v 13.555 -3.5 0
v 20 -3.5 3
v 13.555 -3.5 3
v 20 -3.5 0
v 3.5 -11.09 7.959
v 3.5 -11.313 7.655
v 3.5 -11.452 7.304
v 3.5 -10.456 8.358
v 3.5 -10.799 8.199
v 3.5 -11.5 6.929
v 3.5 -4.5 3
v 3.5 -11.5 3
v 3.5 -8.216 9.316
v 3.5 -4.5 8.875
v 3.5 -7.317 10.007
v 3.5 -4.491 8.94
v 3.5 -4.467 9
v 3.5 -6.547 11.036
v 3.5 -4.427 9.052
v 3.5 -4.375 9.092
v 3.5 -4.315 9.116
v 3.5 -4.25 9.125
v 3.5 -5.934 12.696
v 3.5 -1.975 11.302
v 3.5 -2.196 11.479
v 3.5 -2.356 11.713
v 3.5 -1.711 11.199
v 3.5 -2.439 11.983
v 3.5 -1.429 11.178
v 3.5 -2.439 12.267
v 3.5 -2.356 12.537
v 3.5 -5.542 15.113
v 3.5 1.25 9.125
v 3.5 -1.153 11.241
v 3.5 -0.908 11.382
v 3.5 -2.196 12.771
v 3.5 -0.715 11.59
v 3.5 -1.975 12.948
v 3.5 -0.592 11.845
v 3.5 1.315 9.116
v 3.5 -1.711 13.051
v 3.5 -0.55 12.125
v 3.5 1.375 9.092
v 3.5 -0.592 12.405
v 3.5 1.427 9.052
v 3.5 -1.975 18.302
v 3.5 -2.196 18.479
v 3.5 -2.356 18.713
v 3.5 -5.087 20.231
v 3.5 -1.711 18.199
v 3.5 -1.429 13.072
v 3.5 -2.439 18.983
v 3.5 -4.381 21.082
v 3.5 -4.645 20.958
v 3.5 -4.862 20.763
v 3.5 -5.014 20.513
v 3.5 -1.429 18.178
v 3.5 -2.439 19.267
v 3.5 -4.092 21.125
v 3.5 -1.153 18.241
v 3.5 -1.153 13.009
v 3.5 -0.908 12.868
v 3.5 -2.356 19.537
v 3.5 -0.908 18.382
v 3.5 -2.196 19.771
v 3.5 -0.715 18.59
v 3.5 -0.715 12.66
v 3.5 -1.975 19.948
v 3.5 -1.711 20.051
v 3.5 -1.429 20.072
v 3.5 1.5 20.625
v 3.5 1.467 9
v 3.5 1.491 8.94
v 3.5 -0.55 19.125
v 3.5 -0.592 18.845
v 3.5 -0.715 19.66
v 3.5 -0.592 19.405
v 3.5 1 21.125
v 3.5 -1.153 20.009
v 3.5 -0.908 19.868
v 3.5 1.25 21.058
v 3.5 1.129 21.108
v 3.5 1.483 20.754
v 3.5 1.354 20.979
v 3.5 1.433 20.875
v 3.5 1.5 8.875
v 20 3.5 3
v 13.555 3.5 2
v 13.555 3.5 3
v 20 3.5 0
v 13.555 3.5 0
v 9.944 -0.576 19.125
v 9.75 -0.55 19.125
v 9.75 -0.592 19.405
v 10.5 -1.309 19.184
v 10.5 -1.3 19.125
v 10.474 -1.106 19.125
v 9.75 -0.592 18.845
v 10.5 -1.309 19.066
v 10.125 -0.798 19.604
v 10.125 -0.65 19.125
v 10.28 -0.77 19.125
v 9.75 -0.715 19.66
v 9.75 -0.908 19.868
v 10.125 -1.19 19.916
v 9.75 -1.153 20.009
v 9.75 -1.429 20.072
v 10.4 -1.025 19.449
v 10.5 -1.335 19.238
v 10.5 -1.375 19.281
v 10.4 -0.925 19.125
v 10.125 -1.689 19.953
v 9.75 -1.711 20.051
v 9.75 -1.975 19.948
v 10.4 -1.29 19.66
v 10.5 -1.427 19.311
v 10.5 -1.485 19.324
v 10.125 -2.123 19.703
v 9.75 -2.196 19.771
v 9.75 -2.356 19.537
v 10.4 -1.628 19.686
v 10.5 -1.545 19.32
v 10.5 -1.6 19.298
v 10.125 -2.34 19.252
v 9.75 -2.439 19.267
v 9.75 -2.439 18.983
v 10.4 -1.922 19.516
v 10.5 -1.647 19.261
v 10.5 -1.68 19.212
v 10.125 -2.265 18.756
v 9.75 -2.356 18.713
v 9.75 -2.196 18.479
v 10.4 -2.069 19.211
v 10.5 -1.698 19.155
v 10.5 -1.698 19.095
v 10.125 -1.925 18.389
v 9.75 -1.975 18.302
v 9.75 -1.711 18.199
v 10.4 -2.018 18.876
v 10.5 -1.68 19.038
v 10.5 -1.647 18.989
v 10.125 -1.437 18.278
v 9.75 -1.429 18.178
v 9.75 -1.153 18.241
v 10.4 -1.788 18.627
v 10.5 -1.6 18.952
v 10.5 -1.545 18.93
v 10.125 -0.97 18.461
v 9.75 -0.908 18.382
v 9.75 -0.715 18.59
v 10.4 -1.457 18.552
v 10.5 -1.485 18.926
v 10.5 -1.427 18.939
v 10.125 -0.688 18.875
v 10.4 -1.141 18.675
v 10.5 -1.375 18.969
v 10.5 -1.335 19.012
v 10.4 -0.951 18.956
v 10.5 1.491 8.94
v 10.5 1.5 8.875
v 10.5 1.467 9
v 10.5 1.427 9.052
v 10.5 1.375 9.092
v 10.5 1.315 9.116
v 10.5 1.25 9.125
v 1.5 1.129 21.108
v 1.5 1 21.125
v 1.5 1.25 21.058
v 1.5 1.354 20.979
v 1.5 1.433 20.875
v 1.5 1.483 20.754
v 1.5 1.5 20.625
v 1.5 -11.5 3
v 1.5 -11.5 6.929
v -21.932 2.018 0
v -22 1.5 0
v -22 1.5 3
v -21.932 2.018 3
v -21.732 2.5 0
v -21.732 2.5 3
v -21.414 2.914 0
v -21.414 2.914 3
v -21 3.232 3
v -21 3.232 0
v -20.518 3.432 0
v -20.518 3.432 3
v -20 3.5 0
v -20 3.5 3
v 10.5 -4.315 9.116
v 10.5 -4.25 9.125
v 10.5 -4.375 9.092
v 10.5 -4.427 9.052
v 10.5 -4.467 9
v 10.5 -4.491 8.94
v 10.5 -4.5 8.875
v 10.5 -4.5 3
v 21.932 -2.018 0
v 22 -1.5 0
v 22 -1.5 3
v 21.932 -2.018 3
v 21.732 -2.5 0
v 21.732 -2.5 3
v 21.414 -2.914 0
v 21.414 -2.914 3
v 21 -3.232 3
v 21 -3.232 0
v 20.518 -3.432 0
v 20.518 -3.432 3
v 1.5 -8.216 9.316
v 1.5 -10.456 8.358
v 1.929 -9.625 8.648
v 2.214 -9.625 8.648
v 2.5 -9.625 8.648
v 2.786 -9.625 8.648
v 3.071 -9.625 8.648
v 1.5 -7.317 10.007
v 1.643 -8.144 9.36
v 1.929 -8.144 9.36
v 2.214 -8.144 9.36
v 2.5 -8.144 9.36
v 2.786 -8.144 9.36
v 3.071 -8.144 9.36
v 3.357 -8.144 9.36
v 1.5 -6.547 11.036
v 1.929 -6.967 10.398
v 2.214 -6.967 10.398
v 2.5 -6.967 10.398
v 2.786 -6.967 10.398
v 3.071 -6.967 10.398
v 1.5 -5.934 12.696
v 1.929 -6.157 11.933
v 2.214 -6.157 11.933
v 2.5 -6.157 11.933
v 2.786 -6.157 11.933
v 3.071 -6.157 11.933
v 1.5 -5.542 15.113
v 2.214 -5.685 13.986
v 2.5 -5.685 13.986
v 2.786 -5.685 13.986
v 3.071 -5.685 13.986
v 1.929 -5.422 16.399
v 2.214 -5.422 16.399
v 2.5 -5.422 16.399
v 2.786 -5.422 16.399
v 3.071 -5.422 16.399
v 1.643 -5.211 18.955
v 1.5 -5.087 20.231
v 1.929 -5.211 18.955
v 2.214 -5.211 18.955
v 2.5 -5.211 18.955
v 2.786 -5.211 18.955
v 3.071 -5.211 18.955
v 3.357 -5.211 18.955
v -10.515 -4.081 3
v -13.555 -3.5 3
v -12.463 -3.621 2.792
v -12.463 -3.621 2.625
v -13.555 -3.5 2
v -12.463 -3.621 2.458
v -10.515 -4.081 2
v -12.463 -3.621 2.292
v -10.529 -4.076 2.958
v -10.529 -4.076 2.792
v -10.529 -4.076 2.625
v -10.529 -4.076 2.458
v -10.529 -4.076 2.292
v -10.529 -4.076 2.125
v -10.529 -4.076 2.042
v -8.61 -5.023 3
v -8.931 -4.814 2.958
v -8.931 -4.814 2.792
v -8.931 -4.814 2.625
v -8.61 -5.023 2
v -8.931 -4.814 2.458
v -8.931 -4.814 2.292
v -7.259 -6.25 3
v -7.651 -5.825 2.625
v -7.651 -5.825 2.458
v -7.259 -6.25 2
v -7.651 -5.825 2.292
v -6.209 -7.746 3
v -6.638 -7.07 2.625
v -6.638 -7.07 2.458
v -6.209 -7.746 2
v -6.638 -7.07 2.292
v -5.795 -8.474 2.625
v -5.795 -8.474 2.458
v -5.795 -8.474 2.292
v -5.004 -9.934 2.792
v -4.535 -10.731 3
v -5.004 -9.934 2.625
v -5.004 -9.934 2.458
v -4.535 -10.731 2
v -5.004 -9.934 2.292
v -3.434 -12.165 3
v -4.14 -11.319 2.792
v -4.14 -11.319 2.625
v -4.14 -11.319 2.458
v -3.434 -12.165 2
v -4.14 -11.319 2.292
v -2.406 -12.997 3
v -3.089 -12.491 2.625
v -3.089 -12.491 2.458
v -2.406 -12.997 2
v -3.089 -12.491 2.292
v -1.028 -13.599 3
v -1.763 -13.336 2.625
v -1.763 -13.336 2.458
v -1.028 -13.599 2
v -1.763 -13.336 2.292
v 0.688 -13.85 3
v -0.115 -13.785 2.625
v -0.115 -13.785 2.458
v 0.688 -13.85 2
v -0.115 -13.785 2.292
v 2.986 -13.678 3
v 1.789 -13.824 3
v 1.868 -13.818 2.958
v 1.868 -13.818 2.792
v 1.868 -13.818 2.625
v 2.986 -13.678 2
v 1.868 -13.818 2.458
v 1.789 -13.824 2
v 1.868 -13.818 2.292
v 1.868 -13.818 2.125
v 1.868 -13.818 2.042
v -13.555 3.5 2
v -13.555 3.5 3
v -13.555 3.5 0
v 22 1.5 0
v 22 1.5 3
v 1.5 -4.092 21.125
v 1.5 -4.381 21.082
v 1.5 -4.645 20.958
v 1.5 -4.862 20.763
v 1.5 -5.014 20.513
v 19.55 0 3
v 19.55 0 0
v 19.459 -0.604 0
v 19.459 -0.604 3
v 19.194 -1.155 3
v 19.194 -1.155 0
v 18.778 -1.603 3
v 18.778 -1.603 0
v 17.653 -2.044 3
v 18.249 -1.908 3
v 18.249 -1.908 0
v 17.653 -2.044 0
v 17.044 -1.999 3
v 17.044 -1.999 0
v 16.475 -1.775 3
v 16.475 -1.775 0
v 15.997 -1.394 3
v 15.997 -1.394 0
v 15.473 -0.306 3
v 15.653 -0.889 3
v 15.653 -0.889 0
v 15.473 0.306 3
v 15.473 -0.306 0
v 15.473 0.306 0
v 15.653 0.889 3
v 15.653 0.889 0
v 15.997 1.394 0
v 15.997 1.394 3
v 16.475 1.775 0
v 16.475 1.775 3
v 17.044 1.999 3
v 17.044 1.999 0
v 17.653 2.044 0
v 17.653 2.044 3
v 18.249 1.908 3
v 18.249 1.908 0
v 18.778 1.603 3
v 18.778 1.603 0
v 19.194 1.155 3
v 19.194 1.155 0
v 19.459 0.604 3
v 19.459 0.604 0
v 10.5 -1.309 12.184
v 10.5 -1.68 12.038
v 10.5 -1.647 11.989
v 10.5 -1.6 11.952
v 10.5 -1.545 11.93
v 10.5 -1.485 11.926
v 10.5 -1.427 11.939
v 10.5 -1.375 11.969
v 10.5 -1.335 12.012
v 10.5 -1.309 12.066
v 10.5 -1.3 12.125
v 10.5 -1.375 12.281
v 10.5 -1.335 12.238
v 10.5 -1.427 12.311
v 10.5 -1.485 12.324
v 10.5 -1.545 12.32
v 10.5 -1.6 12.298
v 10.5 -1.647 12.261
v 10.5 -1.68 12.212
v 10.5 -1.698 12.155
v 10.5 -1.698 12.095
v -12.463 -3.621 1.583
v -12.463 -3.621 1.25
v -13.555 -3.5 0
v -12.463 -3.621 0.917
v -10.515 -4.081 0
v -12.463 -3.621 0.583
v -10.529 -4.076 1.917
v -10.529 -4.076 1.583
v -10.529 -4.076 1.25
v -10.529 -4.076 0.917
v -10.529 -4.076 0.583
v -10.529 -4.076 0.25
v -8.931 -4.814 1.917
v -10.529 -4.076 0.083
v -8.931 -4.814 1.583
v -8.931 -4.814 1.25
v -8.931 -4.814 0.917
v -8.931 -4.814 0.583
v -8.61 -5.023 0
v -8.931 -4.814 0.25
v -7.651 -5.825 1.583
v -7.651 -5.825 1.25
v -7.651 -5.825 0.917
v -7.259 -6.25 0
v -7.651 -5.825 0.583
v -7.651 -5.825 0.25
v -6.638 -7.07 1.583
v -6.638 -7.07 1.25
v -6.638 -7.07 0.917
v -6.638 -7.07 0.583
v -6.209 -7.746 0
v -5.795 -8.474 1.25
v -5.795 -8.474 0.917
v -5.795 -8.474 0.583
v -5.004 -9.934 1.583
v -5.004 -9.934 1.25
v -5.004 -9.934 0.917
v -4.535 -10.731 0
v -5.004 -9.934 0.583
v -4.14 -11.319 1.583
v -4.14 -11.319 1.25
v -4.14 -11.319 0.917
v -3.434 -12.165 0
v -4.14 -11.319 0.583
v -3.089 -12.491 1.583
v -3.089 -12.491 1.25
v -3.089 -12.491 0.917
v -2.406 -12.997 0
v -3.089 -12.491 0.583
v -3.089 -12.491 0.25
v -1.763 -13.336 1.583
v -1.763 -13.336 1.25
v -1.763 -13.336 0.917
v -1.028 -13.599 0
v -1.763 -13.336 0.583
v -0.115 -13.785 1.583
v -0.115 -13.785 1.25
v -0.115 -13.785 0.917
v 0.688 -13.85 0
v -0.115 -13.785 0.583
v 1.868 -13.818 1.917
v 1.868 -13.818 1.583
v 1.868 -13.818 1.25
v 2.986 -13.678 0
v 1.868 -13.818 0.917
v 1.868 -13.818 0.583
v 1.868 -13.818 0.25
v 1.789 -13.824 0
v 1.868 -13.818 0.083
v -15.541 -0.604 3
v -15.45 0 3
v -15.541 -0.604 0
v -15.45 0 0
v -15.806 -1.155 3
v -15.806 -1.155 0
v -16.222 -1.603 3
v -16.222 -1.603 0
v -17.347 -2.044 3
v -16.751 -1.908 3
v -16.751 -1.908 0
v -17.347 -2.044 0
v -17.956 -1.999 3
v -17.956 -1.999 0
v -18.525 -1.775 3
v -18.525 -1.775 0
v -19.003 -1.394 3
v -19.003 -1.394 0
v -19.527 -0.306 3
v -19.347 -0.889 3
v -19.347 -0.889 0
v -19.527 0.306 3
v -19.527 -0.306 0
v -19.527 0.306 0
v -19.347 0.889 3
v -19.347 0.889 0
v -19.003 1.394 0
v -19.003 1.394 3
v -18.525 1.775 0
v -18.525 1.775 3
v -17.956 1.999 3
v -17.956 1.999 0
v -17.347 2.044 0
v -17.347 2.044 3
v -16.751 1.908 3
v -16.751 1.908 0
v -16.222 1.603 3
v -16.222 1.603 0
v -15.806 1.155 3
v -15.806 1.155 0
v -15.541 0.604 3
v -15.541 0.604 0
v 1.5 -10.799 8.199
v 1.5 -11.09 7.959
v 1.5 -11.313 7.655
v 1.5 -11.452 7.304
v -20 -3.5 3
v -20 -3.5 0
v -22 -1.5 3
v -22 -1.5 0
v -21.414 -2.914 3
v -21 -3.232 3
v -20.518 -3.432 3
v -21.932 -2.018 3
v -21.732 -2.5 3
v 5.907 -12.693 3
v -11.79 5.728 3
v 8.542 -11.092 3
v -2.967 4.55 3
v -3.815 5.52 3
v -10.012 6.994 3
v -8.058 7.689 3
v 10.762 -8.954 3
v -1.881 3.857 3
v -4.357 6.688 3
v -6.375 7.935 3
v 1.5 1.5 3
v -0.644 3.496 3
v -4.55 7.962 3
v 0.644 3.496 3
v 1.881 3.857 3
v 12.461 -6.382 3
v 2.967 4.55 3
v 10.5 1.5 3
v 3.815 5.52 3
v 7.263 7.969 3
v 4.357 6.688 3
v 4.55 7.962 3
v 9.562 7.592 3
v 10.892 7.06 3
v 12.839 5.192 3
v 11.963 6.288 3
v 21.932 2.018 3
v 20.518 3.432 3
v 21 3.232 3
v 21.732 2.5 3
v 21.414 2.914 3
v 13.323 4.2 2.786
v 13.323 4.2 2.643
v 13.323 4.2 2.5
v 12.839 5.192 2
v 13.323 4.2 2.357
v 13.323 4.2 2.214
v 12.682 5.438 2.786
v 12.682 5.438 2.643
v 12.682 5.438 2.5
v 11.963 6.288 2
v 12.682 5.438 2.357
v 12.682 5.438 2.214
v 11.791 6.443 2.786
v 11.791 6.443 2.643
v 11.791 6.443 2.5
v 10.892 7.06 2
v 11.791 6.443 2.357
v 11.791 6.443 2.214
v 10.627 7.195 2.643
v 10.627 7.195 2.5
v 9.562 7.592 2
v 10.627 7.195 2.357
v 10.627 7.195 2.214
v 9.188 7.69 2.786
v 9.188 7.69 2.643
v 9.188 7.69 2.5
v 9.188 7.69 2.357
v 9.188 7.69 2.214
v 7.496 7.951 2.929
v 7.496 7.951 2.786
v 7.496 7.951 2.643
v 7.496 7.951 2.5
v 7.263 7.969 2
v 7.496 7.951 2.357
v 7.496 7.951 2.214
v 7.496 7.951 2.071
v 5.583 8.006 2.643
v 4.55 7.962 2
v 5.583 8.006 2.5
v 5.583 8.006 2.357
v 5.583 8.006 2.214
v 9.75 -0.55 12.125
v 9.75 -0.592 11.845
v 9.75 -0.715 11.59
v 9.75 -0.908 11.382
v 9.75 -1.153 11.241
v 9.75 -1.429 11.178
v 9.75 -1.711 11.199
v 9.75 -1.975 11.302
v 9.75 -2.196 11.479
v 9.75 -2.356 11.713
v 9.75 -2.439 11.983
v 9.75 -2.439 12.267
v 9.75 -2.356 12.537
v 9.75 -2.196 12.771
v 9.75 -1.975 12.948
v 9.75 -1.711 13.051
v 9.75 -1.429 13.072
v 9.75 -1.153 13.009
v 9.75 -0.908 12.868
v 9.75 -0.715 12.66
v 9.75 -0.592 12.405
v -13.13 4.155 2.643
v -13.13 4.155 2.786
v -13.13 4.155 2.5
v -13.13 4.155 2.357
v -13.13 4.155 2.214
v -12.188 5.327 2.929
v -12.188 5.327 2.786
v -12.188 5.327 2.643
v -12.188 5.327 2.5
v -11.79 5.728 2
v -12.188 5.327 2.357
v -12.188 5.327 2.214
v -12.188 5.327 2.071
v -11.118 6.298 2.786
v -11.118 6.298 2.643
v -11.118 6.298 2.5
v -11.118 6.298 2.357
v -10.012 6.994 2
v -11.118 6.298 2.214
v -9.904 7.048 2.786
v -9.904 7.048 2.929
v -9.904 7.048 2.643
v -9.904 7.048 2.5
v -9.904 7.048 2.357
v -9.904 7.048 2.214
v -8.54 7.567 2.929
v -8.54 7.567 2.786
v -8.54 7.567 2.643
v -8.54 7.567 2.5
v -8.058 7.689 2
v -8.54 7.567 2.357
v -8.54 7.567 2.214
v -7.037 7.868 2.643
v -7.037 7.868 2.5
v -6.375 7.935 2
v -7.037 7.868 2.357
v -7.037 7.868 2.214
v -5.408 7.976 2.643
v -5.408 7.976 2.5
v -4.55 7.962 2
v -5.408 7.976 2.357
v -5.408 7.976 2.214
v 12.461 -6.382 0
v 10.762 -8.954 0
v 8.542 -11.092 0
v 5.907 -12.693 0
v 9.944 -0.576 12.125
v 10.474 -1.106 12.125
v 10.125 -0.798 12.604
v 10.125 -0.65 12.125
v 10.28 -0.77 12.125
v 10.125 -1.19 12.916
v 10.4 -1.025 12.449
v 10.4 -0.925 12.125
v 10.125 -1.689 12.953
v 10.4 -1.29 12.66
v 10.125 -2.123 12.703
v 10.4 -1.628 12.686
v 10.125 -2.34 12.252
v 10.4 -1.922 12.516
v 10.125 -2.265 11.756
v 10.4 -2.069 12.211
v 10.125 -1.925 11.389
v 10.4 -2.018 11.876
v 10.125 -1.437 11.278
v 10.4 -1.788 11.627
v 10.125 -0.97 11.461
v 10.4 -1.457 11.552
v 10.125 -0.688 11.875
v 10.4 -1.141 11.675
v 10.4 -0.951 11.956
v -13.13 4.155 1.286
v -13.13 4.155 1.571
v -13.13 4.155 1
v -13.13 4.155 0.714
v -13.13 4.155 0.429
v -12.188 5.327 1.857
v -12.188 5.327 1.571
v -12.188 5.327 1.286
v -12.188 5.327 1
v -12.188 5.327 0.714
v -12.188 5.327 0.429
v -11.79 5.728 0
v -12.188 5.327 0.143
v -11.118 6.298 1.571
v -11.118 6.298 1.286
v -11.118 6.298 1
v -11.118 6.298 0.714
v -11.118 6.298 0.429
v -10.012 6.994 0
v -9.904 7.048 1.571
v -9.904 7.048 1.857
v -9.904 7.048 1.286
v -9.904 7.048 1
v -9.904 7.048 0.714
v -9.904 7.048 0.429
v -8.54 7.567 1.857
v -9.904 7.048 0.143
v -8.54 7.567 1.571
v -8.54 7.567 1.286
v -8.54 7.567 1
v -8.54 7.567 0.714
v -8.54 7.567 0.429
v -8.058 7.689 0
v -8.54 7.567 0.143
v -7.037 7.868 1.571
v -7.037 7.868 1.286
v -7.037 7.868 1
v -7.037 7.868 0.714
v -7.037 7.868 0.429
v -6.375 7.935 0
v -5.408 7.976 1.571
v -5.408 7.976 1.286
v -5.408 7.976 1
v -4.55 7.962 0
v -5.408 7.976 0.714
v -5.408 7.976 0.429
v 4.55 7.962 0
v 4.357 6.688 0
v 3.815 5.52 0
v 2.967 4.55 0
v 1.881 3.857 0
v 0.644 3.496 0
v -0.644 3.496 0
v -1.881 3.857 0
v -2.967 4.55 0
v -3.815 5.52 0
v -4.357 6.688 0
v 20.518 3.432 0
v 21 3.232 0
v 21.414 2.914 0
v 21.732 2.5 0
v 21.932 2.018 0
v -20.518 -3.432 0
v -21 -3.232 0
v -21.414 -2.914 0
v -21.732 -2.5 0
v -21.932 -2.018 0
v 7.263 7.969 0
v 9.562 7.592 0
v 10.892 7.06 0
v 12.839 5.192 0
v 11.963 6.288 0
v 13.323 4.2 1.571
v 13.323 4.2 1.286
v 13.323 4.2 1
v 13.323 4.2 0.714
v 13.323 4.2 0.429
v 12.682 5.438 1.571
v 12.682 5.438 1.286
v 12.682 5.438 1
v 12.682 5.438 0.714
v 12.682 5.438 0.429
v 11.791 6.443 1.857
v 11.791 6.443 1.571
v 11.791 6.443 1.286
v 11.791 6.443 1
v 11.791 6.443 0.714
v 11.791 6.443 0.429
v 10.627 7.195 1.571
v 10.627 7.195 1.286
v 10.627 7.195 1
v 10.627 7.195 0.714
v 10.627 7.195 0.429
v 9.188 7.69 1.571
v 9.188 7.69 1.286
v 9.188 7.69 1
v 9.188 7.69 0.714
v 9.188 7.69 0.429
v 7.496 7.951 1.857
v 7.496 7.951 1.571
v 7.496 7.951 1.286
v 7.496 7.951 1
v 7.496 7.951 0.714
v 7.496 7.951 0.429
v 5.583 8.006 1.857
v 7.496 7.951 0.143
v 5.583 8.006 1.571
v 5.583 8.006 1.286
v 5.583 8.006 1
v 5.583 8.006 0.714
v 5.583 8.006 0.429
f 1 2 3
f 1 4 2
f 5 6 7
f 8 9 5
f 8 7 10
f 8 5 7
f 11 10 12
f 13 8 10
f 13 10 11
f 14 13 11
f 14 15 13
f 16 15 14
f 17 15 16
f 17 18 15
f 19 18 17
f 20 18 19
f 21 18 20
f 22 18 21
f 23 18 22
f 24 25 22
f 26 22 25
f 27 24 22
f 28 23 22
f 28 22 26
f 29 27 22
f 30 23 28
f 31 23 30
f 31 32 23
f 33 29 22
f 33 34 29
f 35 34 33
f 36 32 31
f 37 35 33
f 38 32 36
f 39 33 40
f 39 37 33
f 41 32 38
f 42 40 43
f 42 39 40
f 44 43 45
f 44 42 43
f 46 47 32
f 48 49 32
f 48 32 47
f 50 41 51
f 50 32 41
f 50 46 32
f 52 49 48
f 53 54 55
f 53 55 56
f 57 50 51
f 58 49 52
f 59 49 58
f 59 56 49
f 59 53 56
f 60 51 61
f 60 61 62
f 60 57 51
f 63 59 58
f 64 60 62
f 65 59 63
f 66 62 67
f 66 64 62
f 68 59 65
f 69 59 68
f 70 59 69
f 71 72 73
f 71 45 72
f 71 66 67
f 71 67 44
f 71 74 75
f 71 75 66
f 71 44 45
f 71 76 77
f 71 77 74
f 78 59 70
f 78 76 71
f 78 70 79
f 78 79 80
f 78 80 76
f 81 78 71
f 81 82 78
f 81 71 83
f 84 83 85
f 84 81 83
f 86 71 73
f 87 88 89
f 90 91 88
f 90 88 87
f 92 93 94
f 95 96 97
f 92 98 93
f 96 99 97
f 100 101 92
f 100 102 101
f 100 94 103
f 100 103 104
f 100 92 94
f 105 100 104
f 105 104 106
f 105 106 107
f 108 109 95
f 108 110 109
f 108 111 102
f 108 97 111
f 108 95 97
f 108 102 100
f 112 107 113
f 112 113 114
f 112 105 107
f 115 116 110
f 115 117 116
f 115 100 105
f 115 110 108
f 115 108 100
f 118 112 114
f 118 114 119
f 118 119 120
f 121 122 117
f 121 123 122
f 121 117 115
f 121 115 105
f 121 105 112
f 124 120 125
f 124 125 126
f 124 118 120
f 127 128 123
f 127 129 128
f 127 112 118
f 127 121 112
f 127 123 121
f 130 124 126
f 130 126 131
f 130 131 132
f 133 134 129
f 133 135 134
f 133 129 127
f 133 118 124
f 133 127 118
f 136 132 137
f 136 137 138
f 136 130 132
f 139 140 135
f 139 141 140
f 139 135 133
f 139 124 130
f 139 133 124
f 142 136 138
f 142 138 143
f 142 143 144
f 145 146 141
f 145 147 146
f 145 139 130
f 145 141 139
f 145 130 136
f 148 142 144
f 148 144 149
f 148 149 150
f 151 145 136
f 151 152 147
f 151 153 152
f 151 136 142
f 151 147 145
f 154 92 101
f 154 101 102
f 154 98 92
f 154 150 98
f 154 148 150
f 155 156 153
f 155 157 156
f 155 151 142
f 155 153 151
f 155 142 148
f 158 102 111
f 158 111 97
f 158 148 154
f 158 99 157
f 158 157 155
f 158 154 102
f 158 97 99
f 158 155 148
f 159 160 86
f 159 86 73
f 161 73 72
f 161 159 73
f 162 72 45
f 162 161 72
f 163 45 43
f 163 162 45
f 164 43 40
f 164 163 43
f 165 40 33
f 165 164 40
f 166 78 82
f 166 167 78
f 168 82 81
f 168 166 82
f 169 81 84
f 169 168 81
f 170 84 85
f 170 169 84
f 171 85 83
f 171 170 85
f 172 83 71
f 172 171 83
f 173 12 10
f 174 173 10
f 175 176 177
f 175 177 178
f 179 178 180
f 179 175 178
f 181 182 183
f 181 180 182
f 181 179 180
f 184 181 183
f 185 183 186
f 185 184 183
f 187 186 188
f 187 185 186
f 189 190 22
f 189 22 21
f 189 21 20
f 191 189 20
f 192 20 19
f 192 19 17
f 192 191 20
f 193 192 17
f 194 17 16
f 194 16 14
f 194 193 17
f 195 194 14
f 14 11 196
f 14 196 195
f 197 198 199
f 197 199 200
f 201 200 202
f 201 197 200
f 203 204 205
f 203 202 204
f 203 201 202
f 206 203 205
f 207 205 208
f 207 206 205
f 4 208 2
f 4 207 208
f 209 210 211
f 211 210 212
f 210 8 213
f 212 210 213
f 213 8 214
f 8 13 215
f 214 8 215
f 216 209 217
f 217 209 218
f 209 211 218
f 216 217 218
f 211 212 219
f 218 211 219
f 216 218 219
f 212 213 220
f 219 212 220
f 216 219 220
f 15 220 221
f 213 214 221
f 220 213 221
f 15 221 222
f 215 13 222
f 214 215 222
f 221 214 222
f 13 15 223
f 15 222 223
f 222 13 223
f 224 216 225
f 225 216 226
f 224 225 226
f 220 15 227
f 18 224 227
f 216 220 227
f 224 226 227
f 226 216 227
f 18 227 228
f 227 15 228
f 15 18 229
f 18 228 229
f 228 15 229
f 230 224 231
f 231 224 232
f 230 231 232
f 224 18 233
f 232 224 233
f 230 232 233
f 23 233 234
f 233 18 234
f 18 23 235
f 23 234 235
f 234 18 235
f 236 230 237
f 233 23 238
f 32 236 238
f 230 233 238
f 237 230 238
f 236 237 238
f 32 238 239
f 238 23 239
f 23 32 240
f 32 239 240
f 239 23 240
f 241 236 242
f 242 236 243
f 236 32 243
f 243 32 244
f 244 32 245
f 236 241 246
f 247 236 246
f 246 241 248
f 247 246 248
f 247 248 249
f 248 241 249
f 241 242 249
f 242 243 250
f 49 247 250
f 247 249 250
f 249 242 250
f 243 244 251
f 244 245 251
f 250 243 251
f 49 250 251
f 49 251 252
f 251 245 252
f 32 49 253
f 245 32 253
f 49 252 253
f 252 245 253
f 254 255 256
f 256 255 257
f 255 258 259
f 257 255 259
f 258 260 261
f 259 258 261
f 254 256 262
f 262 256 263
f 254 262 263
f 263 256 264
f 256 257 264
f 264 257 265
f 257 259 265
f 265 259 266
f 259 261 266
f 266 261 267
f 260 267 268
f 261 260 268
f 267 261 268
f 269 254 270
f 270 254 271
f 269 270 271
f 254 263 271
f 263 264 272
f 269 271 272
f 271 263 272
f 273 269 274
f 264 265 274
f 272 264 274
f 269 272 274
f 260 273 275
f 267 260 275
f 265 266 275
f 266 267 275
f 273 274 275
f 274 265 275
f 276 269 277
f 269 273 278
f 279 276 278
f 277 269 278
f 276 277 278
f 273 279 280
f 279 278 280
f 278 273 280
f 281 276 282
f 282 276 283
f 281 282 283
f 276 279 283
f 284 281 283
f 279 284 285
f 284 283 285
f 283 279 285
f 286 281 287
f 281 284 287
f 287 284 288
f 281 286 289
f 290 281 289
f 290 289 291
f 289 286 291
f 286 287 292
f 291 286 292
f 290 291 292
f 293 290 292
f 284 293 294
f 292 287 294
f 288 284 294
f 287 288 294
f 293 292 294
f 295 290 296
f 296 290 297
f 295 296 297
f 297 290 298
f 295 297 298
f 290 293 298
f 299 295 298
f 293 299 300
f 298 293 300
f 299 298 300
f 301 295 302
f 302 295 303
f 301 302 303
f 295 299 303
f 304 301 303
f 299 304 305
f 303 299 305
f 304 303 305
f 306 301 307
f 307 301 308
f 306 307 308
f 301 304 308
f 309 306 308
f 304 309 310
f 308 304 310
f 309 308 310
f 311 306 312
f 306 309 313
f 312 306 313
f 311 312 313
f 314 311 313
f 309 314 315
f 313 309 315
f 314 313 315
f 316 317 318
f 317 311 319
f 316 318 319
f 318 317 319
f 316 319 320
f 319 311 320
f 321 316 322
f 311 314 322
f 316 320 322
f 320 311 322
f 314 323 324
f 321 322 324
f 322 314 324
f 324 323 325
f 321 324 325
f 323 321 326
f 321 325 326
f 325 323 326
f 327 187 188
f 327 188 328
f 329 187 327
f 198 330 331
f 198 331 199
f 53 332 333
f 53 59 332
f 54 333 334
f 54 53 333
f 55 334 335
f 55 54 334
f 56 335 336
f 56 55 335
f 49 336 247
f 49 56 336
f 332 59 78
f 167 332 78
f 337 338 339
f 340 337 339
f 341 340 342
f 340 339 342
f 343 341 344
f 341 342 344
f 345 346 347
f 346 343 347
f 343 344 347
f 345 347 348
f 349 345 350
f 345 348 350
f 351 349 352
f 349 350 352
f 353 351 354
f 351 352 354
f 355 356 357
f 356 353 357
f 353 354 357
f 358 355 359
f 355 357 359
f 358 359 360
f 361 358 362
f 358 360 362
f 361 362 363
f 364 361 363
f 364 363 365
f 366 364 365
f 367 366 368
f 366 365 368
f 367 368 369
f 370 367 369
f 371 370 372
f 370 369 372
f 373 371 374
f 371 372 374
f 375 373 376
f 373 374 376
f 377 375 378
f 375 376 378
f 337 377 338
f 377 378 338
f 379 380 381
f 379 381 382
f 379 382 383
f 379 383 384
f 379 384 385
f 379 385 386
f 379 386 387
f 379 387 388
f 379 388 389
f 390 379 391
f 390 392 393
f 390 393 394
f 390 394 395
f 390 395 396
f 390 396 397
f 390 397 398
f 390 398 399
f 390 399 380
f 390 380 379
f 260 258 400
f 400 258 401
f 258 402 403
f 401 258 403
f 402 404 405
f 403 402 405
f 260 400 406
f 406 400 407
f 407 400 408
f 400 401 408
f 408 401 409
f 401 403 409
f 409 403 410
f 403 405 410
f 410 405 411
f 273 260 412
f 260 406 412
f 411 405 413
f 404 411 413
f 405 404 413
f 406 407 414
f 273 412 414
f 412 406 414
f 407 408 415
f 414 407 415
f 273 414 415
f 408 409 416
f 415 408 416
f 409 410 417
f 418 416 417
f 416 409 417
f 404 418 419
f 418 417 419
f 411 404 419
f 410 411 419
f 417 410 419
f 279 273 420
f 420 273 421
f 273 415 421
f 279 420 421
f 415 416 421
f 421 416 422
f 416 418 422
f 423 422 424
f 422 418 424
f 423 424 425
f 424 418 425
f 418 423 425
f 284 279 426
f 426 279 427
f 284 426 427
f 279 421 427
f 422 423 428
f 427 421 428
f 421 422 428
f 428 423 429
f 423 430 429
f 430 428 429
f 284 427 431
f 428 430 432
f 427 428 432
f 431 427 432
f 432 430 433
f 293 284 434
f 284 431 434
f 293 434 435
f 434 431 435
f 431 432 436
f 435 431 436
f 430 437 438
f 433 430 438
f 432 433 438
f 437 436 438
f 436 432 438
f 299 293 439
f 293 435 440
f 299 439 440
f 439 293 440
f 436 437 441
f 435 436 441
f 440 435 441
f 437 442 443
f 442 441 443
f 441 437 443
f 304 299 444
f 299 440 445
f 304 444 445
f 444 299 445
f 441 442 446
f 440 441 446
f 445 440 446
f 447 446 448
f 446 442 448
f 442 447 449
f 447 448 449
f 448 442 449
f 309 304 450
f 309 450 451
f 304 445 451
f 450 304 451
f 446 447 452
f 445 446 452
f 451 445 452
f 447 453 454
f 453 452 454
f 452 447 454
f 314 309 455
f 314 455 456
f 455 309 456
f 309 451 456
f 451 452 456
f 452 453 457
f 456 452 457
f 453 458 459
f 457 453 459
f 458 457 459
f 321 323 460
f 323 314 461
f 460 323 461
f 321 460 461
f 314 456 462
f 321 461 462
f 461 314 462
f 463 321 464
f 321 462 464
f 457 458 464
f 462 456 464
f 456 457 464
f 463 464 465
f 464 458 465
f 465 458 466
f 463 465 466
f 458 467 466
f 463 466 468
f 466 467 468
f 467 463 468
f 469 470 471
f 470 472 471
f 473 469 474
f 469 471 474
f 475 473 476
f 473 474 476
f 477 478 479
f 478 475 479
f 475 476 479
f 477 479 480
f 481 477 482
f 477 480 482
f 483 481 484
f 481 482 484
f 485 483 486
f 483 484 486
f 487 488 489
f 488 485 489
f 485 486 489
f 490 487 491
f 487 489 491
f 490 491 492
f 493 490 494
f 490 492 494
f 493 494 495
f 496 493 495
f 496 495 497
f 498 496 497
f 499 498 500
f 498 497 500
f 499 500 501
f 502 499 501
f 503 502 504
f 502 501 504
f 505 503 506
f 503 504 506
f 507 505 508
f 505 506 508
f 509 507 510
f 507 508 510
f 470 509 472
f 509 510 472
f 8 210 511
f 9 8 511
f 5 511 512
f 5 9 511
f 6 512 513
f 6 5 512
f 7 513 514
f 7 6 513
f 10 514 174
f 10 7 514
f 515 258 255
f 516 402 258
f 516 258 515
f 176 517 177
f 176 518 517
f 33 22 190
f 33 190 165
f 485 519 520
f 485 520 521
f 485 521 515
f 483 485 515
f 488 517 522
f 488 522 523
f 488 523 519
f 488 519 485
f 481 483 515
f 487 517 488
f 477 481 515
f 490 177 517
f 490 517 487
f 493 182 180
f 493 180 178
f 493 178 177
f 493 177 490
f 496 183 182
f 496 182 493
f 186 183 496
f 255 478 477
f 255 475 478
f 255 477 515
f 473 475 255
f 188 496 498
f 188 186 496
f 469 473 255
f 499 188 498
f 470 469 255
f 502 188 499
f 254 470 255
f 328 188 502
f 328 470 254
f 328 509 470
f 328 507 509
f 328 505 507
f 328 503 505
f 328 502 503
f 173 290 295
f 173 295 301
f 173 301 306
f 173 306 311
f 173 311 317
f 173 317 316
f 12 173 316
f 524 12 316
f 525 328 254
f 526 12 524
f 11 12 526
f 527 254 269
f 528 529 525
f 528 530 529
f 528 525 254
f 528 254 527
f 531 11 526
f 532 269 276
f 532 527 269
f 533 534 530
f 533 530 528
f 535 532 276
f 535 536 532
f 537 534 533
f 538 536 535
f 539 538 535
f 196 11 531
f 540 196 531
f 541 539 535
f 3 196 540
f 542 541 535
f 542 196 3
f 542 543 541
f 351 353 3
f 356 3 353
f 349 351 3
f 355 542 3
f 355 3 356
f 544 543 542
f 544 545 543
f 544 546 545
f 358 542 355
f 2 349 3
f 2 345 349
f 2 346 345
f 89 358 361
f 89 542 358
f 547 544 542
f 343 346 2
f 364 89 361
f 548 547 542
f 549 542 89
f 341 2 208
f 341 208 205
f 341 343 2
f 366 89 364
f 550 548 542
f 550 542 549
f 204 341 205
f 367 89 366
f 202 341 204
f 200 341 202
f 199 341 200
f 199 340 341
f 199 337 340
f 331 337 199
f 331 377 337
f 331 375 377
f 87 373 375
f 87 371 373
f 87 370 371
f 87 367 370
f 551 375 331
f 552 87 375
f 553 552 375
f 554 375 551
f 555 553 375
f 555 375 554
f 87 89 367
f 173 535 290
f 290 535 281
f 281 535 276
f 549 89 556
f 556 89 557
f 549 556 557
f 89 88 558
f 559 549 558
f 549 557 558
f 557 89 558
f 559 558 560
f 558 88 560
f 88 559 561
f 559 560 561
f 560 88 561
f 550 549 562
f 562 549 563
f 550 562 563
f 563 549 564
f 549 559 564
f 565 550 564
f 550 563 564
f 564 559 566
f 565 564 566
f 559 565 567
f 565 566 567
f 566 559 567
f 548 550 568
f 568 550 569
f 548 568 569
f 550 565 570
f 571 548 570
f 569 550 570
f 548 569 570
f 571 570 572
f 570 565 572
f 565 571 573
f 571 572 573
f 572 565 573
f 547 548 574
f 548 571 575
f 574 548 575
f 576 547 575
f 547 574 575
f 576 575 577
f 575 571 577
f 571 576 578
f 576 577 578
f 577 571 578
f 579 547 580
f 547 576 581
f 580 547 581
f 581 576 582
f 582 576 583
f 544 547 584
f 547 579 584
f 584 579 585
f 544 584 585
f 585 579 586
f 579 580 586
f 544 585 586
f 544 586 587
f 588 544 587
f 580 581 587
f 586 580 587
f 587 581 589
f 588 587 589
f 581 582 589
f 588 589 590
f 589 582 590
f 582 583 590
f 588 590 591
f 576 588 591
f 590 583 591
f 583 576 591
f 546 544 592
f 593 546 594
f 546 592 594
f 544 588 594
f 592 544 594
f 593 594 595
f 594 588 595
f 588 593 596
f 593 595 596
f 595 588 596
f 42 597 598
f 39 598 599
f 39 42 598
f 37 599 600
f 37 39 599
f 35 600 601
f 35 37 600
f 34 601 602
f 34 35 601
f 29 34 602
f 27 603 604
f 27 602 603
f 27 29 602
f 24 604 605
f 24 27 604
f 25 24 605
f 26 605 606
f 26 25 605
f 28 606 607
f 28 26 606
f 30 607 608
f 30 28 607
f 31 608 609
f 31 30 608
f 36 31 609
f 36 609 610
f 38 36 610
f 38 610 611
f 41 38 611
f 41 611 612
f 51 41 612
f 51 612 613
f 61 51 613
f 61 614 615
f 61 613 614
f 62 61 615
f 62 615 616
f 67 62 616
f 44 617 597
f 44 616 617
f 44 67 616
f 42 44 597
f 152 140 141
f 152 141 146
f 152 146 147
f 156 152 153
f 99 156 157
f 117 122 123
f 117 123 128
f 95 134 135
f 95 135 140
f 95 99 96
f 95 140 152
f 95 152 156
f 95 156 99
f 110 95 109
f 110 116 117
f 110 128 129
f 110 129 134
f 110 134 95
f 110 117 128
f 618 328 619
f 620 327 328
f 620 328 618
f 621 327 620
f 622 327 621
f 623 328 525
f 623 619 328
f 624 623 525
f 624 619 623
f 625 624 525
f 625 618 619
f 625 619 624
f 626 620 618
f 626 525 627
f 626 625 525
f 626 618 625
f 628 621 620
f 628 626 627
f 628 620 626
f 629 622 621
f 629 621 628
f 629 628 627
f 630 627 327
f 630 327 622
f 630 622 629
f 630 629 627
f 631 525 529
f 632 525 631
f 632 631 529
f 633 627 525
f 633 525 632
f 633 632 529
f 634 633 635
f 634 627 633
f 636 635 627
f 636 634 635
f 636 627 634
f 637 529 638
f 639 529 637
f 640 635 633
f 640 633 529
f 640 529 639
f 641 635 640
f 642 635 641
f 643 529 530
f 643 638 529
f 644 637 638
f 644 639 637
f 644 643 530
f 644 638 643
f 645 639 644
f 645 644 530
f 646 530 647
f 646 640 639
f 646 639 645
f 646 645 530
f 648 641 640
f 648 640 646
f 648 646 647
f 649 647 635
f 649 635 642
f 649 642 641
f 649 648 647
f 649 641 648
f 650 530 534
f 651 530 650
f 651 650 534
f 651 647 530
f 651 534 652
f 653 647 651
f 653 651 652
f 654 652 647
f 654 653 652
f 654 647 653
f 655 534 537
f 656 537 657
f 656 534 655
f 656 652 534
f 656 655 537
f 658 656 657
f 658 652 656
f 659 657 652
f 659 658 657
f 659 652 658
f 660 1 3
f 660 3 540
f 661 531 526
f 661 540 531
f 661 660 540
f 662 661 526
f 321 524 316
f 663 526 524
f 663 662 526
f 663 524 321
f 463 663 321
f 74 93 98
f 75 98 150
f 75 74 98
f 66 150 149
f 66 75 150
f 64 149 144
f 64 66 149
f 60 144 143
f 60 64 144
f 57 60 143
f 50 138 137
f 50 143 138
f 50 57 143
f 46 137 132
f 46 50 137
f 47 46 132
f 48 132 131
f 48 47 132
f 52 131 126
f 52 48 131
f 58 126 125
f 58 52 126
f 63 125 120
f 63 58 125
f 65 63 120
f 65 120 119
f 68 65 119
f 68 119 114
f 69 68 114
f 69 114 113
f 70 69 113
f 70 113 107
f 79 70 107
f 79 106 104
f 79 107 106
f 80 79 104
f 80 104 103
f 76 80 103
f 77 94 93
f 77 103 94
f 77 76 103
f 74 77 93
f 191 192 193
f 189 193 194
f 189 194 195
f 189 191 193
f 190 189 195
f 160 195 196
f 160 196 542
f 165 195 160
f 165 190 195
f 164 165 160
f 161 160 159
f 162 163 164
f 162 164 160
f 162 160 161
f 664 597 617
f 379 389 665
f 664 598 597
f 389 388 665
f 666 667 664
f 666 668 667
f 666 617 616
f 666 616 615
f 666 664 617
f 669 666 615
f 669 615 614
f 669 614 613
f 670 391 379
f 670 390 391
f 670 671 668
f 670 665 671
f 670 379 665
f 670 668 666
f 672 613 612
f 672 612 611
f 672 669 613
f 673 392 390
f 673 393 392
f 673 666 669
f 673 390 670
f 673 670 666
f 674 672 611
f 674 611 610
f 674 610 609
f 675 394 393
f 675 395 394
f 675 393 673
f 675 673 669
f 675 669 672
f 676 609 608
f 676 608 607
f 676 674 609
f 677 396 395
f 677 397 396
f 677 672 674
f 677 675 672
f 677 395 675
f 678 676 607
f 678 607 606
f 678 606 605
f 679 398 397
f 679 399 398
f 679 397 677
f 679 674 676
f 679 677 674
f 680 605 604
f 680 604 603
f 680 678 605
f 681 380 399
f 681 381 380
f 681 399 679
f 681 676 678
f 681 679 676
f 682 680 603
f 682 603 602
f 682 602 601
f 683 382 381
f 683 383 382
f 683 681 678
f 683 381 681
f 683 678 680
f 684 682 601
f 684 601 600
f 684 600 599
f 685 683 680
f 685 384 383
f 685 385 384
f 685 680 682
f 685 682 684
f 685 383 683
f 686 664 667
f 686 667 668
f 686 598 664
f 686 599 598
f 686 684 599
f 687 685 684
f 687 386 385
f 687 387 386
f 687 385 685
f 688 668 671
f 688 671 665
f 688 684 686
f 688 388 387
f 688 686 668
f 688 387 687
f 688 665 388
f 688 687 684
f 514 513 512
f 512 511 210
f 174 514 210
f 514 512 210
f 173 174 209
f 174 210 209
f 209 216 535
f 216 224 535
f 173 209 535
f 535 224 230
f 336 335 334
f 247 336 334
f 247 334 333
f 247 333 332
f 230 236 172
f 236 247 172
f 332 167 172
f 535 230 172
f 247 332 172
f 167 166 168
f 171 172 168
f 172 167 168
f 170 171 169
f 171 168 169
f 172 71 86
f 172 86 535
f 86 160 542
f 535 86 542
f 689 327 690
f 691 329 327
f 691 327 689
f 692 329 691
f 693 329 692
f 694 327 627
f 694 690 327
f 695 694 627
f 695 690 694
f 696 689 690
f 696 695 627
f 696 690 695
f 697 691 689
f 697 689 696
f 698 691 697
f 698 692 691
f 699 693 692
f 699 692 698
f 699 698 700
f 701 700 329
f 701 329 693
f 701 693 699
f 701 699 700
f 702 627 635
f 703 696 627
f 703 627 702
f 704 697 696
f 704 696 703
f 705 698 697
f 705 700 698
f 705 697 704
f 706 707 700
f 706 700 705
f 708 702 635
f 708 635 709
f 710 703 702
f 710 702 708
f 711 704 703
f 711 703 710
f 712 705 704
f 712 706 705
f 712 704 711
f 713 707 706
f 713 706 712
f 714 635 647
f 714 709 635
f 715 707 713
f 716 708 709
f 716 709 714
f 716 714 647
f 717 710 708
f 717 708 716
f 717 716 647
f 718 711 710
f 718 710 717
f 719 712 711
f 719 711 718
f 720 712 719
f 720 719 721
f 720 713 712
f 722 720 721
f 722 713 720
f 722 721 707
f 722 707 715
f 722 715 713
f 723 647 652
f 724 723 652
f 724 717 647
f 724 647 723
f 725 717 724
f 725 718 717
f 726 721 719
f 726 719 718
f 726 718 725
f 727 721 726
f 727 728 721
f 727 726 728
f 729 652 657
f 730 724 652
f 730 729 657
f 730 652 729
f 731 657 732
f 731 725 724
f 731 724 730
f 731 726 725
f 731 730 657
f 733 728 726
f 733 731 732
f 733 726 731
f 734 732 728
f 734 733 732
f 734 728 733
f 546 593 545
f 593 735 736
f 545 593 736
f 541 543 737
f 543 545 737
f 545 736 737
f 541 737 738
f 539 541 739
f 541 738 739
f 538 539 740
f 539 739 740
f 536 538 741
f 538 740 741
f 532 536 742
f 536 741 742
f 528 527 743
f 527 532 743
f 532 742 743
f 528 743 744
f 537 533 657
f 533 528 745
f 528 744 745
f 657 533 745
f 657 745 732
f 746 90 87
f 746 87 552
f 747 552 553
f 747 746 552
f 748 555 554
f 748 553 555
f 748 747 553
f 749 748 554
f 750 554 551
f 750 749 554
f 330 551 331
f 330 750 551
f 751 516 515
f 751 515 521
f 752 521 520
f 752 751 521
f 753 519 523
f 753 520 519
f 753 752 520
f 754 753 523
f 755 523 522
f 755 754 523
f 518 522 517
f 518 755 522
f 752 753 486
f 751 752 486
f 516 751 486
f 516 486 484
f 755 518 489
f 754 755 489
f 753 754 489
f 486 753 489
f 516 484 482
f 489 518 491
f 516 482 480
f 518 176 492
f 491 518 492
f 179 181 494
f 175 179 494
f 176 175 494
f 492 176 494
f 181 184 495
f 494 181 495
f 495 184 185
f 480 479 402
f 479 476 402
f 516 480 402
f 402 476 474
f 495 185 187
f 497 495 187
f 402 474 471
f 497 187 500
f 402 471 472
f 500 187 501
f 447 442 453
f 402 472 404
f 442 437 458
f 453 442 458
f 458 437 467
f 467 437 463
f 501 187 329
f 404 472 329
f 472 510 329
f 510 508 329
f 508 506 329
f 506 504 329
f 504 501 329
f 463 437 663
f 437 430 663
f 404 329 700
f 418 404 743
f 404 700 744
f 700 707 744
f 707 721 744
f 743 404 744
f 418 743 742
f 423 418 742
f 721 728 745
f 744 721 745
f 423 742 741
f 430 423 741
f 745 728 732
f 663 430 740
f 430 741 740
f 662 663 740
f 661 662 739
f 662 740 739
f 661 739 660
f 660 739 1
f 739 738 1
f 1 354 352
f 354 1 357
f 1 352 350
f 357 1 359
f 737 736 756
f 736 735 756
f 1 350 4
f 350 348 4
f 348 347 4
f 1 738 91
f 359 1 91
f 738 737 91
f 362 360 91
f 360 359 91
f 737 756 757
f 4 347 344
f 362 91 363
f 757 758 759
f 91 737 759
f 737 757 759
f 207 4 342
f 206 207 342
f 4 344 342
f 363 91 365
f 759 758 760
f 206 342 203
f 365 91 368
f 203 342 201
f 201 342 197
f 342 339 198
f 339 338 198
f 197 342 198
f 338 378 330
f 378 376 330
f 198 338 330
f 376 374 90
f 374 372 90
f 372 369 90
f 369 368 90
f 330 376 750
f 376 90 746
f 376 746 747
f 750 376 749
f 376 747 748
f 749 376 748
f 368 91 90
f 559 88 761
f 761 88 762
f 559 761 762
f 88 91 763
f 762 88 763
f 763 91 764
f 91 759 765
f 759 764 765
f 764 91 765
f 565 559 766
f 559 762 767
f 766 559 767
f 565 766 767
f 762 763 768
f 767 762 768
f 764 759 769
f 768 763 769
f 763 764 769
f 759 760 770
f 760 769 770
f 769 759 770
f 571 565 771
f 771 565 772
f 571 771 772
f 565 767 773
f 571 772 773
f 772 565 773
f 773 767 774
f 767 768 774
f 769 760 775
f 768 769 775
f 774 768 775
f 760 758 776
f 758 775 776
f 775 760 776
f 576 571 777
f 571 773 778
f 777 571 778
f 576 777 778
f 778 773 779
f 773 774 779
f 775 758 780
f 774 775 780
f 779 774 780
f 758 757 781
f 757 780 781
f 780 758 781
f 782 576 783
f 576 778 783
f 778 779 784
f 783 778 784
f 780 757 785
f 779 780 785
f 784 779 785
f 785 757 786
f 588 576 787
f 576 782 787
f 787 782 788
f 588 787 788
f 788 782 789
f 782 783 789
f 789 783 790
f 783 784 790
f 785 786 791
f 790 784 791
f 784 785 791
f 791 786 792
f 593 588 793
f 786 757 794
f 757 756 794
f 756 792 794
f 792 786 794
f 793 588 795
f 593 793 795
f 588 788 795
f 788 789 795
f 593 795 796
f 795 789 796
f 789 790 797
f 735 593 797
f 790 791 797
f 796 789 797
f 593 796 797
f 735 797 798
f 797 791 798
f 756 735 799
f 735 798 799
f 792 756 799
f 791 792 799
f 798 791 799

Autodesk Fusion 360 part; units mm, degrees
sketch "Sketch1" plane through (0, 0, 0) normal (0, 0, 1) x (1, 0, 0)
  line L0 (22, 1.5) -> (22, -1.5)
  line L1 (-22, -1.5) -> (-22, 1.5)
  circle A0 centre (-17.5, 0) radius 2.05
  circle A1 centre (17.5, 0) radius 2.05
  line L2 (-20, 3.5) -> (-13.5554, 3.5)
  line L3 (13.5554, 3.5) -> (20, 3.5)
  line L4 (20, -3.5) -> (13.5554, -3.5)
  line L5 (-13.5554, -3.5) -> (-20, -3.5)
  arc A2 (2.9858, -13.6779) -> (13.5554, -3.5) centre (0, 0) ccw
  arc A3 (22, 1.5) -> (20, 3.5) centre (20, 1.5) ccw
  arc A4 (20, -3.5) -> (22, -1.5) centre (20, -1.5) ccw
  arc A5 (-20, 3.5) -> (-22, 1.5) centre (-20, 1.5) ccw
  arc A6 (-22, -1.5) -> (-20, -3.5) centre (-20, -1.5) ccw
  circle A7 centre (0, 8) radius 4.55
  circle A8 centre (0, 8) radius 2.5
  spline S0 degree 5 poles (-13.5554, 3.5) (-13.4403, 3.6899) (-13.2044, 4.0607) (-12.8333, 4.5904) (-12.3036, 5.2425) (-11.5792, 5.9613) (-10.7872, 6.5756) (-9.9224, 7.0772) (-8.9826, 7.4626) (-7.9714, 7.7375) (-6.8944, 7.9106) (-5.9846, 7.9745) (-5.2769, 7.9832) (-4.794, 7.9718) (-4.5498, 7.9619) knots 0 0 0 0 0 0 0.1 0.2 0.3 0.4 0.5 0.6 0.7 0.8 0.9 1 1 1 1 1 1
  spline S1 degree 5 poles (13.5554, 3.5) (13.4982, 3.7035) (13.3727, 4.1002) (13.1508, 4.664) (12.7869, 5.3525) (12.2112, 6.1007) (11.5055, 6.7281) (10.6616, 7.2269) (9.6796, 7.5974) (8.5689, 7.8482) (7.3412, 7.9903) (6.2741, 8.0248) (5.429, 8.0092) (4.8462, 7.9807) (4.5498, 7.9619) knots 0 0 0 0 0 0 0.1 0.2 0.3 0.4 0.5 0.6 0.7 0.8 0.9 1 1 1 1 1 1
  spline S2 degree 5 poles (-13.5554, -3.5) (-13.2832, -3.5207) (-12.7507, -3.5722) (-11.9881, -3.6799) (-11.0436, -3.8844) (-9.9844, -4.2425) (-9.0464, -4.7029) (-8.2259, -5.2635) (-7.5154, -5.9188) (-6.9, -6.6582) (-6.3595, -7.4662) (-5.8692, -8.3231) (-5.4024, -9.2053) (-4.9312, -10.086) (-4.4284, -10.9351) (-3.8687, -11.7217) (-3.2294, -12.4165) (-2.4919, -12.994) (-1.6428, -13.4356) (-0.6752, -13.7313) (0.4139, -13.8766) (1.3823, -13.872) (2.163, -13.8011) (2.7075, -13.724) (2.9858, -13.6779) knots 0 0 0 0 0 0 0.05 0.1 0.15 0.2 0.25 0.3 0.35 0.4 0.45 0.5 0.55 0.6 0.65 0.7 0.75 0.8 0.85 0.9 0.95 1 1 1 1 1 1
  point P0 (-22, 3.5)
  point P1 (22, 3.5)
  point P2 (-22, -3.5)
  point P3 (-10, 7)
  point P4 (11, 7)
  point P5 (-8.024, -5.4772)
  point P6 (-5.3692, -9.2647)
  point P7 (-2.6437, -12.8398)
  dimension "d1" = 44
  dimension "d2" = 28
  dimension "d3" = 7
  dimension "d4" = 3.5
  dimension "d5" = 22
  dimension "d6" = 4.1
  dimension "d7" = 17.5
  dimension "d8" = 4.1
  dimension "d9" = 17.5
  dimension "d10" = 2
  dimension "d11" = 9.1
  dimension "d12" = 8
  dimension "d38" = 5
extrude "Extrude1" add sketch "Sketch1" along normal blind 2 contours L0 L1 L2 L3 L4 L5 A2 A3 A4 A5 A6 A7 S0 S1 S2
ref_plane "WorkPlane2" through (2.5, 0, 12.125) normal (1, 0, 0) x (0, 0, 1)
sketch "Sketch3" plane through (2.5, 0, 12.125) normal (1, 0, 0) x (0, 1, 0)
  line L0 (-4.0924, 9) -> (1.5, 9)
  line L1 (1.5, 9) -> (1.5, -11)
  line L2 (1.5, -11) -> (-11.5, -11)
  line L3 (-11.5, -11) -> (-11.5, -5.1958)
  circle A0 centre (-1.5, 7) radius 0.95
  circle A1 centre (-1.5, 0) radius 0.95
  line L4 (-4.5, -3) -> (1.5, -3)
  line L5 (1.5, -3) -> (1.5, -11)
  line L6 (1.5, -11) -> (-4.5, -11)
  line L7 (-4.5, -11) -> (-4.5, -3)
  spline S0 degree 5 poles (-10.4562, -3.7668) (-10.2158, -3.6901) (-9.7455, -3.5307) (-9.072, -3.2741) (-8.2432, -2.8843) (-7.3521, -2.2495) (-6.6362, -1.3928) (-6.1133, -0.2594) (-5.7654, 1.1445) (-5.5459, 2.7614) (-5.3974, 4.5131) (-5.29, 5.9577) (-5.1959, 7.0367) (-5.1246, 7.7503) (-5.0868, 8.1057) knots 0 0 0 0 0 0 0.1 0.2 0.3 0.4 0.5 0.6 0.7 0.8 0.9 1 1 1 1 1 1
  arc A2 (-4.0924, 9) -> (-5.0868, 8.1057) centre (-4.0924, 8) ccw
  arc A3 (-10.4562, -3.7668) -> (-11.5, -5.1958) centre (-10, -5.1958) ccw
  point P0 (-6.5, -1)
  dimension "d21" = 9
  dimension "d23" = 1.5
  dimension "d32" = 1.9
  dimension "d33" = 1.9
  dimension "d34" = 7
  dimension "d35" = 3
  dimension "d36" = 8
  dimension "d37" = 6
  dimension "d47" = 1
  dimension "d48" = 1.5
  dimension "d73" = 5.5924
  dimension "d74" = 13
  dimension "d75" = 10
  dimension "d88" = 2
  dimension "d89" = 3
extrude "Extrude12" add 1 faces at (-0.4768, -5.597, 2) along direction (0, 0, 1) blind 1
extrude "Extrude5" add sketch "Sketch3" along normal blind -1 and the other way blind -1 contours L0 L1 L2 L3 L4 L7 S0 A2 A3 | L1 L2 L4 L5 L6 L7 | A0 | A1
extrude "Extrude6" add sketch "Sketch3" along normal blind 8 contours L1 L2 L4 L5 L6 L7 | A0 | A1
fillet "Fillet1" radius 0.75 1 edges at (10.5, -2.3857, 11.7815)
fillet "Fillet2" radius 0.75 1 edges at (10.5, -2.3857, 18.7815)
fillet "Fillet4" radius 0.5 1 edges at (2.5, 1.5, 21.125)
fillet "Fillet3" radius 0.25 2 edges at (7, -4.5, 9.125) (7, 1.5, 9.125)
